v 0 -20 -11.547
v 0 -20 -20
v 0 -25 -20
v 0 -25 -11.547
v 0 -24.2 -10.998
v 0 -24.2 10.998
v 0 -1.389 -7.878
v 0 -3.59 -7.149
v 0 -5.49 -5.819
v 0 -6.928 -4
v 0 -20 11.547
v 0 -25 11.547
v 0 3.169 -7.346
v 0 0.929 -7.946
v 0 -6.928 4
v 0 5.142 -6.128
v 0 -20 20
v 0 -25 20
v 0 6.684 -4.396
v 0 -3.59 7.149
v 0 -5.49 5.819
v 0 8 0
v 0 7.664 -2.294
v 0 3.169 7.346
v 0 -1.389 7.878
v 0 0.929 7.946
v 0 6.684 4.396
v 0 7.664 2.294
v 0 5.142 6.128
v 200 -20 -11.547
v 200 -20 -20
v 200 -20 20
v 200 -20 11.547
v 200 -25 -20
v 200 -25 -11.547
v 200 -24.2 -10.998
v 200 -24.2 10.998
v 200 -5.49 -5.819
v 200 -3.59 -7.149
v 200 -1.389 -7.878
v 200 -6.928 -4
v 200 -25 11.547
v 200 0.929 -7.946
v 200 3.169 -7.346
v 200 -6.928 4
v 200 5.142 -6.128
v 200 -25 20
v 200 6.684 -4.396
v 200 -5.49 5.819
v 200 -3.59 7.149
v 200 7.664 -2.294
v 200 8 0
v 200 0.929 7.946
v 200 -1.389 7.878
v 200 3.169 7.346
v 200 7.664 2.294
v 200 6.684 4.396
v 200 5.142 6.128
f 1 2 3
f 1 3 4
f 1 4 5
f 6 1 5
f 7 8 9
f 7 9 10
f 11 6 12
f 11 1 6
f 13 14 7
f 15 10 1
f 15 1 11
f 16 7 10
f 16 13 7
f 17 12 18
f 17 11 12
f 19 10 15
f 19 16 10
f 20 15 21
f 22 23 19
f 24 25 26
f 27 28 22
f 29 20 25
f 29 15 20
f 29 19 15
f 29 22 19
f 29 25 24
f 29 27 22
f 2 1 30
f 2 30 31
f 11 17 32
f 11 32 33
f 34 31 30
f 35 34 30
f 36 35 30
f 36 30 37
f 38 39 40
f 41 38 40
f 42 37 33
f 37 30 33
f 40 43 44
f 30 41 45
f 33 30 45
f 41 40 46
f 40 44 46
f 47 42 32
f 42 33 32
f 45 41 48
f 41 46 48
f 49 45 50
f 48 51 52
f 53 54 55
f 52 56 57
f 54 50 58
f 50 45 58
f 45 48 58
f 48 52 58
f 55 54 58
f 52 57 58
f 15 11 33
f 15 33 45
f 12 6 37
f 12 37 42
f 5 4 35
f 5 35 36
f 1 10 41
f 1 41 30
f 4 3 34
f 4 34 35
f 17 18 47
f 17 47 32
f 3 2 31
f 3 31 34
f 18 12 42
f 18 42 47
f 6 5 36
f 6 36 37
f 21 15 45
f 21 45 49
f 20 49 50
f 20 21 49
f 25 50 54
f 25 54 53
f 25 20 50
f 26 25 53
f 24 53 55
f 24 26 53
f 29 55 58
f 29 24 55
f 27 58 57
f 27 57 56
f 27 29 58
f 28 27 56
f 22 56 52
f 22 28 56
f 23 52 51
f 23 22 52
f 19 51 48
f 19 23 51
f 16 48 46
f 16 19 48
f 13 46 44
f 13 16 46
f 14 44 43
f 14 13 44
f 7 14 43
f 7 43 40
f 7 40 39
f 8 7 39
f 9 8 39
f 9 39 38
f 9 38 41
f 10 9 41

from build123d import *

# Parameters (mm, degrees)
BOSS_EXTRUDE1_DEPTH = 200


with BuildPart() as part:
    # Sketch1 → Boss-Extrude1 (new body)
    with BuildSketch(Plane(origin=(0, 0, 0), x_dir=(0, 0, -1), z_dir=(1, 0, 0))):
        with BuildLine():
            Line((-20, -25), (-20, -20))
            Line((-20, -20), (-11.547005384, -20))
            Line((-11.547005384, -20), (-4, -6.92820323))
            ThreePointArc((-4, -6.92820323), (0, 8), (4, -6.92820323))
            Line((4, -6.92820323), (11.547005384, -20))
            Line((11.547005384, -20), (20, -20))
            Line((20, -20), (20, -25))
            Line((20, -25), (11.547005384, -25))
            Line((11.547005384, -25), (10.997825762, -24.2))
            Line((10.997825762, -24.2), (-10.997825762, -24.2))
            Line((-10.997825762, -24.2), (-11.547005384, -25))
            Line((-11.547005384, -25), (-20, -25))
        make_face()
    extrude(amount=BOSS_EXTRUDE1_DEPTH)


solid = part.part
